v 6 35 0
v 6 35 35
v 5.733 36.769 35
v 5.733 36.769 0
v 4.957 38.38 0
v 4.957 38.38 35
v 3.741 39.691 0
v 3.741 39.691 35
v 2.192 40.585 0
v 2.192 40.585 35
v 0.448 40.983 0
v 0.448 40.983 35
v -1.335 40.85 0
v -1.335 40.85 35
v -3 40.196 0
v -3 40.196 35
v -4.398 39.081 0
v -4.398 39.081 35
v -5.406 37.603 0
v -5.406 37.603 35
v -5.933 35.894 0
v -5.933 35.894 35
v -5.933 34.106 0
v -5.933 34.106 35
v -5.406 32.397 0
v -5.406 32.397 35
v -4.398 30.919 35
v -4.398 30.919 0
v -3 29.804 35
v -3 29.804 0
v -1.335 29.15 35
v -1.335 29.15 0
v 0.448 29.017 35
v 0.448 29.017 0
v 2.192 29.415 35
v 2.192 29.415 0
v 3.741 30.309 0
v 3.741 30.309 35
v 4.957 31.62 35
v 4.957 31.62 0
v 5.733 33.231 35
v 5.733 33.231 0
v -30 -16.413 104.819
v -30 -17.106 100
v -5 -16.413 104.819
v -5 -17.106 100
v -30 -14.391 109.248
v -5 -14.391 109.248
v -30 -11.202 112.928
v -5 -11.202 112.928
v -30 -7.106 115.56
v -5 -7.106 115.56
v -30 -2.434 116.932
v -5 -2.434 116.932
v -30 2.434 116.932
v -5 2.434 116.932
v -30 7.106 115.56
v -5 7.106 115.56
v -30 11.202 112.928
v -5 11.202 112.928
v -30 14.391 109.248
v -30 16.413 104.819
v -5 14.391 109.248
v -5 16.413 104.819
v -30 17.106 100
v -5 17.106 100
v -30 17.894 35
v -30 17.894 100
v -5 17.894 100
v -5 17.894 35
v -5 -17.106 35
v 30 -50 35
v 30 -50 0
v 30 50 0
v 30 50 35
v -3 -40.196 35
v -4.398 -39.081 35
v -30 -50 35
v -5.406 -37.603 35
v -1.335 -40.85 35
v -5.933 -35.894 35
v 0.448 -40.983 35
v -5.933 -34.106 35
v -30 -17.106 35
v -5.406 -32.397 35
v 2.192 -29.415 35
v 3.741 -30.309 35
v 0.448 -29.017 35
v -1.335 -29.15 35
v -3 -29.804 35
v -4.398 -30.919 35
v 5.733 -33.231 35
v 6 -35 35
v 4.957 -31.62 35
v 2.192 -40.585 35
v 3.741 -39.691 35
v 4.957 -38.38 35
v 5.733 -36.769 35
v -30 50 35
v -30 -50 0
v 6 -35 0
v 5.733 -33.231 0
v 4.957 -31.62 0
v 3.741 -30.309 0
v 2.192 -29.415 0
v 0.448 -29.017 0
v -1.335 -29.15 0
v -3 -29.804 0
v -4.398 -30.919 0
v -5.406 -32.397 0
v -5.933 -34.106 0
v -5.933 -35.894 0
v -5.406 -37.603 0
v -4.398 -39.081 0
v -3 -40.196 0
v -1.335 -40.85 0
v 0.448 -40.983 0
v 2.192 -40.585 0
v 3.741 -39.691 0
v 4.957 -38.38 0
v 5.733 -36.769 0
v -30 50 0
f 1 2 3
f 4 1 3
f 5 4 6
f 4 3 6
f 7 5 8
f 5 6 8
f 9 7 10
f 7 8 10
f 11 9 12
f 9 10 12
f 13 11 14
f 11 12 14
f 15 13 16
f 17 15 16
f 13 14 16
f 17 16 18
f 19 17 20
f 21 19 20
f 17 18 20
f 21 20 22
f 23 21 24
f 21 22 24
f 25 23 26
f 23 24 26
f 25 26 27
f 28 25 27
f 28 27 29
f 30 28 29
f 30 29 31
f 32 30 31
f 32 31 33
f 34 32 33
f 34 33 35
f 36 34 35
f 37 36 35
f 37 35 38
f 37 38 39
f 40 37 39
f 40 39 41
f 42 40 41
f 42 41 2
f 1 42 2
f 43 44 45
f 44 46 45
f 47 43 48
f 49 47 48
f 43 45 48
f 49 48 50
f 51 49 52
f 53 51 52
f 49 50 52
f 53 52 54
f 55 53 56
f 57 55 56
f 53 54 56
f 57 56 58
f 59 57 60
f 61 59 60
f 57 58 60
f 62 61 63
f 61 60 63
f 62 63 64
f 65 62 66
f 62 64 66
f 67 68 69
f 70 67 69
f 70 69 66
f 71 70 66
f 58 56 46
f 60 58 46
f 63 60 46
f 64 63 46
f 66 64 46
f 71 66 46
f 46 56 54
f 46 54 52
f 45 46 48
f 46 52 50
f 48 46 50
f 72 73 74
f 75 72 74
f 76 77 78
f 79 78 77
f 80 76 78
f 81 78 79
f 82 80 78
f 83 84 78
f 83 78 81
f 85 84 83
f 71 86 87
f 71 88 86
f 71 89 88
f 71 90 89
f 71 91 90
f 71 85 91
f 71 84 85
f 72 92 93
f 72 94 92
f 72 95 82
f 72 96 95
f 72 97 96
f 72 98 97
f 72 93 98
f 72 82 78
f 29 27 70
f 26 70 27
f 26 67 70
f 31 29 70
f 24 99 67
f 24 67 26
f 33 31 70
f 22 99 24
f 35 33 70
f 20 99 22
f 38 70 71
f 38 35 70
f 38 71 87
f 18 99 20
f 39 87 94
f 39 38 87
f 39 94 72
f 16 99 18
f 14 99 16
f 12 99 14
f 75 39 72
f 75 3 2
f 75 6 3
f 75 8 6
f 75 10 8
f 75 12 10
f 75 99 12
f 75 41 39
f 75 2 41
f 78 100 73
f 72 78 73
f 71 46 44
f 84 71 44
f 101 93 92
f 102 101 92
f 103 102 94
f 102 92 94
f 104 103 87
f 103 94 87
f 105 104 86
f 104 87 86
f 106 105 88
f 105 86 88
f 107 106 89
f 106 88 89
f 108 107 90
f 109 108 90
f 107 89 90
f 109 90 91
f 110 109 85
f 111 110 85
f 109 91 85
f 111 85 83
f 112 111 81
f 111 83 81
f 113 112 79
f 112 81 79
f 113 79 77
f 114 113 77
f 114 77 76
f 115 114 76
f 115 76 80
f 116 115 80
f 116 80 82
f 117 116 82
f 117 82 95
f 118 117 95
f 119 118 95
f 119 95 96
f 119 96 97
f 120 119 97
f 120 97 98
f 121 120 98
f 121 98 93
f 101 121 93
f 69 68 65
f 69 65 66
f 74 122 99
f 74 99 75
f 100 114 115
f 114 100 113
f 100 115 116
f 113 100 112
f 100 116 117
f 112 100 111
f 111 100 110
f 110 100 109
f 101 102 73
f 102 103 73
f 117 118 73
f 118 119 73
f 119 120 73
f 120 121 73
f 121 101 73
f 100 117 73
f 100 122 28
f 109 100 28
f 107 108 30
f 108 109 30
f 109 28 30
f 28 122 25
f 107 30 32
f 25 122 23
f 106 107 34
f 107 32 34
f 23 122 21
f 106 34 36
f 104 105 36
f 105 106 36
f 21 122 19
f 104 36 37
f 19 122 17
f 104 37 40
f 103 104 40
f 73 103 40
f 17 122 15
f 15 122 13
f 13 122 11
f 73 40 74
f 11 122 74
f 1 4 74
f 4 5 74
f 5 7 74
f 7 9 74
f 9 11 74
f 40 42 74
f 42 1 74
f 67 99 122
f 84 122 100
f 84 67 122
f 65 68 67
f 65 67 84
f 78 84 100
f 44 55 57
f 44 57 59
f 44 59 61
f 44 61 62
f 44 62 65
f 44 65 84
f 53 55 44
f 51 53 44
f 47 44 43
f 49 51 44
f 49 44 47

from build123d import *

# Parameters (mm, degrees)
F0_W     = 60
F0_H     = 100
F1_DEPTH = 100
F2_R     = 6
F3_DEPTH = 100
F4_R     = 6
F5_DEPTH = 65
F6_W     = 25
F6_H     = 17.1061154245
F7_ANGLE = 180


with BuildPart() as f1:
    # F0 (on Top) → F1 (new body)
    with BuildSketch(Plane.XY):
        Rectangle(F0_W, F0_H)
    extrude(amount=F1_DEPTH)

    # F2 (on face) → F3 (cut)
    with BuildSketch(Plane.XY.offset(100)):
        with Locations((0, 35)):
            Circle(F2_R)
        with Locations((0, -35)):
            Circle(F2_R)
    extrude(amount=-F3_DEPTH, mode=Mode.SUBTRACT)

    # F4 (on face) → F5 (cut)
    with BuildSketch(Plane.XY.offset(100)):
        Polygon((-30, 50), (-30, 17.8938845755), (-5, 17.8938845755), (-5, -17.1061154245), (-30, -17.1061154245), (-30, -50), (30, -50), (30, 50), align=None)
        with Locations((0, -35)):
            Circle(F4_R, mode=Mode.SUBTRACT)
        with Locations((0, 35)):
            Circle(F4_R, mode=Mode.SUBTRACT)
    extrude(amount=-F5_DEPTH, mode=Mode.SUBTRACT)

    # F6 (on face) → F7 (revolve)
    with BuildSketch(Plane.XY.offset(100)):
        with Locations((-17.5, -8.5530577123)):
            Rectangle(F6_W, F6_H)
    revolve(axis=Axis((-17.5, 0, 100), (-1, 0, 0)), revolution_arc=F7_ANGLE)


solid = f1.part
